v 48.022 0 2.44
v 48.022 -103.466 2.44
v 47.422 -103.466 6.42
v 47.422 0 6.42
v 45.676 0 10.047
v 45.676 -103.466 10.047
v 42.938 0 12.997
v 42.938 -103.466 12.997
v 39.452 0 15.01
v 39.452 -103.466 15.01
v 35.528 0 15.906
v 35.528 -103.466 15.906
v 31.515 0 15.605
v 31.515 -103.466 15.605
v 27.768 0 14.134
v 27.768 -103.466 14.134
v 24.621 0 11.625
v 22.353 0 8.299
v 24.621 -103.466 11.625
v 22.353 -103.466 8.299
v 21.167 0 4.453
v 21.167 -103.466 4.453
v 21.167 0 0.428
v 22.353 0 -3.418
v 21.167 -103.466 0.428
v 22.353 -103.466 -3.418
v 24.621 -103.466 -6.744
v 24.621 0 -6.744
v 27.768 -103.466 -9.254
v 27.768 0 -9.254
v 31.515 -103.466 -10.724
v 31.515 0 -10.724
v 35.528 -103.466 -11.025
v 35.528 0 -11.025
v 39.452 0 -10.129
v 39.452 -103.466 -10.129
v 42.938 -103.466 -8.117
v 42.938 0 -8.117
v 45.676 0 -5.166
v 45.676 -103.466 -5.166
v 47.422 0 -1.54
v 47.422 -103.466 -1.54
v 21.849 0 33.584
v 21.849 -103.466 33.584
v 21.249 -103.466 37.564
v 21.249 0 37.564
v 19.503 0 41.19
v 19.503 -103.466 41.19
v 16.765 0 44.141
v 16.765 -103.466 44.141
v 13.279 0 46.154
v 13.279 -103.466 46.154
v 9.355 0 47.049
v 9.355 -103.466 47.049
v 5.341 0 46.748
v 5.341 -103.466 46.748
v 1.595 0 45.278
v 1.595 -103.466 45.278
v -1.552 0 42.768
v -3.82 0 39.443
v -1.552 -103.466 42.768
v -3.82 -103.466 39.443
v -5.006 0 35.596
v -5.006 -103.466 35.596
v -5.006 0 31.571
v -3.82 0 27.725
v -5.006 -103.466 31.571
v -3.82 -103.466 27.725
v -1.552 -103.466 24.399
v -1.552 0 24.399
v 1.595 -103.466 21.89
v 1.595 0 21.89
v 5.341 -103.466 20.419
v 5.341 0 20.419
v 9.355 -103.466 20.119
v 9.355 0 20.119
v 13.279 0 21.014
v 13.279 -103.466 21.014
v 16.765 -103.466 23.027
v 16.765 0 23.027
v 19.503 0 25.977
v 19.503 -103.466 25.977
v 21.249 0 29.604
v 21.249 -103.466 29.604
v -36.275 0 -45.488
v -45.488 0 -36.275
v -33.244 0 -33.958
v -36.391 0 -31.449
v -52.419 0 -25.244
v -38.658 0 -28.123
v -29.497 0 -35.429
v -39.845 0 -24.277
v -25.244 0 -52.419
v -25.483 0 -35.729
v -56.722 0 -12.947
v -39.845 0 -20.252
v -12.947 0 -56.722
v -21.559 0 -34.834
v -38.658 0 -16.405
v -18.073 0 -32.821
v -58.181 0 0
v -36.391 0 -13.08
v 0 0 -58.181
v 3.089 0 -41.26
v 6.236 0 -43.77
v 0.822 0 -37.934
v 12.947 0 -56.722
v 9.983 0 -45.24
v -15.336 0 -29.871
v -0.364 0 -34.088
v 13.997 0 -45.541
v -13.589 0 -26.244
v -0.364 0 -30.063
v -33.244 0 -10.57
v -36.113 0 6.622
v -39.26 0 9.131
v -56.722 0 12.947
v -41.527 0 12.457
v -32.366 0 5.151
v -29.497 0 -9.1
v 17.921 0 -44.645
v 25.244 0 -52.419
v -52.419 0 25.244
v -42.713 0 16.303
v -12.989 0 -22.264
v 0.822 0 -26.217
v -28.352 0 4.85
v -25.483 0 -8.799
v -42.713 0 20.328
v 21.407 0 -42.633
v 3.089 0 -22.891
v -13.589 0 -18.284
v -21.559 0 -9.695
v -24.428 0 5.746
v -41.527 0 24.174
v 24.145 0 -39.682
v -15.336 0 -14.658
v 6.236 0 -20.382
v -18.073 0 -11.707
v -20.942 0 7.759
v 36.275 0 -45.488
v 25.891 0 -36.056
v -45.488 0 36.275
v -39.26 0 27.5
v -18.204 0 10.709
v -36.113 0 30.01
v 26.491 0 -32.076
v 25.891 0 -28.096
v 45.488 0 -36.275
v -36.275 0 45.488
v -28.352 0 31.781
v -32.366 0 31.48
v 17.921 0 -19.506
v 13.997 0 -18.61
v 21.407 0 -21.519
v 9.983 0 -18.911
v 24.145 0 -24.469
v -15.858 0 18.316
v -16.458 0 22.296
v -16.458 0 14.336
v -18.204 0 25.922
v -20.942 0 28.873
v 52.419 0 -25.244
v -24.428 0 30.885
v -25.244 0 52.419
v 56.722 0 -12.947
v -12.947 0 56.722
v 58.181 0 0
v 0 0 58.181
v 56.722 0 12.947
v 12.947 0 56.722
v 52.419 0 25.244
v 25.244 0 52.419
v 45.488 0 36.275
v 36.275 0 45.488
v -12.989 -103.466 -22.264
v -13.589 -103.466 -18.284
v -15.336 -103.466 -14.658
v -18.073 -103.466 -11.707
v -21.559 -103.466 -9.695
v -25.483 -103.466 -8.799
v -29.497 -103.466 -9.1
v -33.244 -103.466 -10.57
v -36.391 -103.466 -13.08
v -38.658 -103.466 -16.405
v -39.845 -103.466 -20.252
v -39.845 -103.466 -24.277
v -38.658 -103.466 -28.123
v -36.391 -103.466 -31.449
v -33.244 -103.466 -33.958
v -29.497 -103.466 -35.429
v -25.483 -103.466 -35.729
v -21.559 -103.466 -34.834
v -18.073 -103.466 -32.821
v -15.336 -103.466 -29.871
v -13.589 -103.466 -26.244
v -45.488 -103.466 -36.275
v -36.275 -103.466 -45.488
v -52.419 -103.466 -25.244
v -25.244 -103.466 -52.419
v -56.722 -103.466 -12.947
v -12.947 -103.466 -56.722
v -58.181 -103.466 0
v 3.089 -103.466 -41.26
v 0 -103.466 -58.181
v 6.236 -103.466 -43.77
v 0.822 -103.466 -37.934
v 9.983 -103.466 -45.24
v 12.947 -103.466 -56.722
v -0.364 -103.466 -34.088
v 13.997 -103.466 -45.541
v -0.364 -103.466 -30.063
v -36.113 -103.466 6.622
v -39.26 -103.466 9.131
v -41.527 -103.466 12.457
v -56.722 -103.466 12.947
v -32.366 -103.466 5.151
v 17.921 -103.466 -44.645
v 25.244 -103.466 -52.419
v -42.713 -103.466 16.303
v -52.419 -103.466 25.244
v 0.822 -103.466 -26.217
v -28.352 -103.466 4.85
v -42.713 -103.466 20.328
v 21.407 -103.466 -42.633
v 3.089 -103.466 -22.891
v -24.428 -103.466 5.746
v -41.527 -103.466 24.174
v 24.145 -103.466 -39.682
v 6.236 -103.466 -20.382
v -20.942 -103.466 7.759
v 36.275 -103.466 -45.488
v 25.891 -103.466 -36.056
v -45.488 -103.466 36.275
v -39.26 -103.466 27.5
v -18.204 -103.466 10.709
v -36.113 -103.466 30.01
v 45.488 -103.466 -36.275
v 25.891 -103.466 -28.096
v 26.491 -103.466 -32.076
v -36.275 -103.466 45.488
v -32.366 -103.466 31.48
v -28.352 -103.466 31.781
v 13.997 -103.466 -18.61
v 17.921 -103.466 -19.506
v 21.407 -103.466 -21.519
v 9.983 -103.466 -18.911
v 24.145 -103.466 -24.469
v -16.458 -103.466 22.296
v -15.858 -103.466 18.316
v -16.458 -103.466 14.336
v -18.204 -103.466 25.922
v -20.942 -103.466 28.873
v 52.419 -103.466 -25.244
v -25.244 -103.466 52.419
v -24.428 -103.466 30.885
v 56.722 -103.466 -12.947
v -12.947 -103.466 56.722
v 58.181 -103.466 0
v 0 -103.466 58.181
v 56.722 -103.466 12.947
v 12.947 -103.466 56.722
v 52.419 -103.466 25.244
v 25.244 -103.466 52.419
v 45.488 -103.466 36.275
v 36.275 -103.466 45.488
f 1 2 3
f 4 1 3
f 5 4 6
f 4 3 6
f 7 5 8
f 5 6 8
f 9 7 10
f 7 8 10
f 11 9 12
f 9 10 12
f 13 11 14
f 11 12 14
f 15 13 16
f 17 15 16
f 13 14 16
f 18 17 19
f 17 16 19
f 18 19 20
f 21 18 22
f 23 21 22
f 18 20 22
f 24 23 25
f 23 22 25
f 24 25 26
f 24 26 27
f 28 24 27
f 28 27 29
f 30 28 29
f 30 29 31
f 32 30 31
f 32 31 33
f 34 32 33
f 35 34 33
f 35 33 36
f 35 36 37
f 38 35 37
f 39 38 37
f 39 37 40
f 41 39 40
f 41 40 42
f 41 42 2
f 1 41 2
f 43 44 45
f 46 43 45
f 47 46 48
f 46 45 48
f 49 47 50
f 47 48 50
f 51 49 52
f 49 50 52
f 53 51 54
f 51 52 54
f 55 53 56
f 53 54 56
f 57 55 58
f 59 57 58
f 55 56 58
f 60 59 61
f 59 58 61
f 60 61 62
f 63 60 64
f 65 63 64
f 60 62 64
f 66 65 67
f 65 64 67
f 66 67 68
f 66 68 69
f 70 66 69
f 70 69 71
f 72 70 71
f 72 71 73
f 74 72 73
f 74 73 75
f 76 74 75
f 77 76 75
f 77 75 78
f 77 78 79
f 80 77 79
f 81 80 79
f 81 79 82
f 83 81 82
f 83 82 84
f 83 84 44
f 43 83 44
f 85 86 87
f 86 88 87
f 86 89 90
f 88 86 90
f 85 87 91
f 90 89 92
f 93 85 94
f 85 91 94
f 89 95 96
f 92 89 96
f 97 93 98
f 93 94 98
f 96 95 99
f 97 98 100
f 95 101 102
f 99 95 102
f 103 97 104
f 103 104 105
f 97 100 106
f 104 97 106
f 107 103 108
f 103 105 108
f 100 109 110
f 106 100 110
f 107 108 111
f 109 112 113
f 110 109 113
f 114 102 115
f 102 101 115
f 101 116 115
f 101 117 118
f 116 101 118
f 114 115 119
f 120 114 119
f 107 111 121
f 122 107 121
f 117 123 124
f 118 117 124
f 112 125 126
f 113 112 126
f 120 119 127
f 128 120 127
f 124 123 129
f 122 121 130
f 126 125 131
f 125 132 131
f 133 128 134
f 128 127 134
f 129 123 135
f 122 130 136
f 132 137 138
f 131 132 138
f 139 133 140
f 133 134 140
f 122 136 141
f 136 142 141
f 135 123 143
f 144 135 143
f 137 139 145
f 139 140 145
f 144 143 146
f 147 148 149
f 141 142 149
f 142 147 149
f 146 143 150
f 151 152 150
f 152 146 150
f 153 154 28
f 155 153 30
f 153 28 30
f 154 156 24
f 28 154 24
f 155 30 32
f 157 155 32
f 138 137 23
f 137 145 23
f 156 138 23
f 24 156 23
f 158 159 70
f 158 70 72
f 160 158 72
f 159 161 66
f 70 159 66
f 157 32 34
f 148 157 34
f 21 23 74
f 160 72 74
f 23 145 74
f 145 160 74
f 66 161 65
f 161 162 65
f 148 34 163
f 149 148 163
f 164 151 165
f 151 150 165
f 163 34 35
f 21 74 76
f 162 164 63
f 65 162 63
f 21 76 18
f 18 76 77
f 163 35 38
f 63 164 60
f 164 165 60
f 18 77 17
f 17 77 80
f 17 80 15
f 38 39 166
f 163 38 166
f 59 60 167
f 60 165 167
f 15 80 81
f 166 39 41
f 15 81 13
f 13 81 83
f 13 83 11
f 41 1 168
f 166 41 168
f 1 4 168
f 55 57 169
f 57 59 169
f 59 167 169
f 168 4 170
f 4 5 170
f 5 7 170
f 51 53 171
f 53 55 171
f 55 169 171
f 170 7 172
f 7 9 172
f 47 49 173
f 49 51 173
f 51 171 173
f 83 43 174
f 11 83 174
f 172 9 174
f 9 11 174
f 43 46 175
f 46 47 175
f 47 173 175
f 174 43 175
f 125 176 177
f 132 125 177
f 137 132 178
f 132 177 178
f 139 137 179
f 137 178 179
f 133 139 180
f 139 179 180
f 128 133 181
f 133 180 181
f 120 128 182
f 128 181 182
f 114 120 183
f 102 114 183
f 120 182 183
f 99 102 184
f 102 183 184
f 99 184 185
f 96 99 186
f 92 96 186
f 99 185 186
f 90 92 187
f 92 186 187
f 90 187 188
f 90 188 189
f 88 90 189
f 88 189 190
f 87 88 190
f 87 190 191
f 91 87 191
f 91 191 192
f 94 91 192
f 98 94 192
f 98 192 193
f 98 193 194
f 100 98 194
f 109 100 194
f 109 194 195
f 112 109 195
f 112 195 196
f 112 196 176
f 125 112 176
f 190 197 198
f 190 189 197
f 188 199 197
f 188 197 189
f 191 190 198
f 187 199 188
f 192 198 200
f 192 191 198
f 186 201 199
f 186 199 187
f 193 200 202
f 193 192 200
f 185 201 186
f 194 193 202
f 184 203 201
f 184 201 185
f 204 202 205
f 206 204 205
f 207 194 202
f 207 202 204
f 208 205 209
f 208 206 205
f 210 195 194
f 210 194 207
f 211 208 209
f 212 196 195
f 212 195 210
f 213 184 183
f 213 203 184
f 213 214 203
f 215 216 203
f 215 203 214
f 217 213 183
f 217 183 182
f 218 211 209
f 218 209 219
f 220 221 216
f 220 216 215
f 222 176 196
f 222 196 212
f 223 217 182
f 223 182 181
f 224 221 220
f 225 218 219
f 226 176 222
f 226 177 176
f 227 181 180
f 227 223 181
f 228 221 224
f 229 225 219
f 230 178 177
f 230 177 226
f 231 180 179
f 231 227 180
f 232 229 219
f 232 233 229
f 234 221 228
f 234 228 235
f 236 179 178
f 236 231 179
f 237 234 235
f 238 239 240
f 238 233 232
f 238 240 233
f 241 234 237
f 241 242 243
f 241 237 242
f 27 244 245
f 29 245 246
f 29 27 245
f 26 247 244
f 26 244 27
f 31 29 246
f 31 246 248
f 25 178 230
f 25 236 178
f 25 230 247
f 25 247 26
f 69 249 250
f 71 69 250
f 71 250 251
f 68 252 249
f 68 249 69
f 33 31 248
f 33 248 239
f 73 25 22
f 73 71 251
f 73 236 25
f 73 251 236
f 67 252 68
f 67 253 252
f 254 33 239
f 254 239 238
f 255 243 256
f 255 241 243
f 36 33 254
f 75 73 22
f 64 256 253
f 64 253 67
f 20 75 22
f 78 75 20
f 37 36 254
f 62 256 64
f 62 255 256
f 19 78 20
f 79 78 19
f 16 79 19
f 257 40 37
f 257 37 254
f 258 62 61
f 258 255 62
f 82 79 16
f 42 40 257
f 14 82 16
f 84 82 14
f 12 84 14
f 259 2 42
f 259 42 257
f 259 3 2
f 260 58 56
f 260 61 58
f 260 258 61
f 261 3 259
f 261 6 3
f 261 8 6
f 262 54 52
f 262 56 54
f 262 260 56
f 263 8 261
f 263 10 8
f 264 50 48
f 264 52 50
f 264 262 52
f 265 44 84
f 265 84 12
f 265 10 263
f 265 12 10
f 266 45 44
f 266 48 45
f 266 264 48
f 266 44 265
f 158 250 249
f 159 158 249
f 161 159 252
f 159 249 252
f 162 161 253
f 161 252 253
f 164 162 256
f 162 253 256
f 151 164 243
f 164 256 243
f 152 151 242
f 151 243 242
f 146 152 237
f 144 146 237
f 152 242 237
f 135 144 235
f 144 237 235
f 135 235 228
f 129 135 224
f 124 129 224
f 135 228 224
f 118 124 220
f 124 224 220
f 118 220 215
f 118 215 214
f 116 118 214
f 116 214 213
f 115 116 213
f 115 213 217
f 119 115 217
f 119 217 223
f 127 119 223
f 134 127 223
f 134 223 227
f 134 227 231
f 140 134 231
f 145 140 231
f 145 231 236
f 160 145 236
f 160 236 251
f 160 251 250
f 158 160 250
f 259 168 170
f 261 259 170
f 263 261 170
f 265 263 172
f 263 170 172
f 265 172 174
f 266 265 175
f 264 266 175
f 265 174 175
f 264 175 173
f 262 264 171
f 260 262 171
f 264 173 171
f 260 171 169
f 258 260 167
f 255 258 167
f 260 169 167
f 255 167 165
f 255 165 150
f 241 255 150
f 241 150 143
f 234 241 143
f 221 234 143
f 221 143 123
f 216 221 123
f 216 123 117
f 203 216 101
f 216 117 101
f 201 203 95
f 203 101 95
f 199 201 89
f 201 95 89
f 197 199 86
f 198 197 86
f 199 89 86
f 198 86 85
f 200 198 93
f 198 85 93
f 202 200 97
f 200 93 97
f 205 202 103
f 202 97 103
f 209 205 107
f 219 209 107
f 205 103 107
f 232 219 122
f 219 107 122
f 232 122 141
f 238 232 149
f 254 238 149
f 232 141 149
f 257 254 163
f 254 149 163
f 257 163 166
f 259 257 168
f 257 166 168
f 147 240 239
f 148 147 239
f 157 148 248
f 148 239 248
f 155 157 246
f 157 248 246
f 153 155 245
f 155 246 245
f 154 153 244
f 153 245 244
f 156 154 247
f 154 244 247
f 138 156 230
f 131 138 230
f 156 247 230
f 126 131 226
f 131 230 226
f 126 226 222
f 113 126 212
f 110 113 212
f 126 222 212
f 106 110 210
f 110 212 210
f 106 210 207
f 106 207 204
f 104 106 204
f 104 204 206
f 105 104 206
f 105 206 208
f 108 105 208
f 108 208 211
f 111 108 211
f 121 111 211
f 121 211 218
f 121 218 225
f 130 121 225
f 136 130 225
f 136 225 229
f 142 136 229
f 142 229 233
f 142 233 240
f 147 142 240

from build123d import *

# Parameters (mm, degrees)
F0_R     = 58.18106
F1_DEPTH = 103.465883
F2_R     = 13.503073
F3_DEPTH = 177.737946
F4_DEPTH = 213.257074


with BuildPart() as f1:
    # F0 (on Front) → F1 (new body)
    with BuildSketch(Plane.XZ):
        Circle(F0_R)
    extrude(amount=F1_DEPTH)

    # F2 (on face) → F3 (cut)
    with BuildSketch(Plane.XZ.offset(103.465883)):
        with Locations((8.346159, 33.583872)):
            Circle(F2_R)
    extrude(amount=-F3_DEPTH, mode=Mode.SUBTRACT)

    # F2 (on face) → F4 (cut)
    with BuildSketch(Plane.XZ.offset(103.465883)):
        with Locations((-29.361053, 18.31566)):
            Circle(F2_R)
        with Locations((-26.492292, -22.264171)):
            Circle(F2_R)
        with Locations((12.987918, -32.075673)):
            Circle(F2_R)
        with Locations((34.519265, 2.440317)):
            Circle(F2_R)
    extrude(amount=-F4_DEPTH, mode=Mode.SUBTRACT)


solid = f1.part
